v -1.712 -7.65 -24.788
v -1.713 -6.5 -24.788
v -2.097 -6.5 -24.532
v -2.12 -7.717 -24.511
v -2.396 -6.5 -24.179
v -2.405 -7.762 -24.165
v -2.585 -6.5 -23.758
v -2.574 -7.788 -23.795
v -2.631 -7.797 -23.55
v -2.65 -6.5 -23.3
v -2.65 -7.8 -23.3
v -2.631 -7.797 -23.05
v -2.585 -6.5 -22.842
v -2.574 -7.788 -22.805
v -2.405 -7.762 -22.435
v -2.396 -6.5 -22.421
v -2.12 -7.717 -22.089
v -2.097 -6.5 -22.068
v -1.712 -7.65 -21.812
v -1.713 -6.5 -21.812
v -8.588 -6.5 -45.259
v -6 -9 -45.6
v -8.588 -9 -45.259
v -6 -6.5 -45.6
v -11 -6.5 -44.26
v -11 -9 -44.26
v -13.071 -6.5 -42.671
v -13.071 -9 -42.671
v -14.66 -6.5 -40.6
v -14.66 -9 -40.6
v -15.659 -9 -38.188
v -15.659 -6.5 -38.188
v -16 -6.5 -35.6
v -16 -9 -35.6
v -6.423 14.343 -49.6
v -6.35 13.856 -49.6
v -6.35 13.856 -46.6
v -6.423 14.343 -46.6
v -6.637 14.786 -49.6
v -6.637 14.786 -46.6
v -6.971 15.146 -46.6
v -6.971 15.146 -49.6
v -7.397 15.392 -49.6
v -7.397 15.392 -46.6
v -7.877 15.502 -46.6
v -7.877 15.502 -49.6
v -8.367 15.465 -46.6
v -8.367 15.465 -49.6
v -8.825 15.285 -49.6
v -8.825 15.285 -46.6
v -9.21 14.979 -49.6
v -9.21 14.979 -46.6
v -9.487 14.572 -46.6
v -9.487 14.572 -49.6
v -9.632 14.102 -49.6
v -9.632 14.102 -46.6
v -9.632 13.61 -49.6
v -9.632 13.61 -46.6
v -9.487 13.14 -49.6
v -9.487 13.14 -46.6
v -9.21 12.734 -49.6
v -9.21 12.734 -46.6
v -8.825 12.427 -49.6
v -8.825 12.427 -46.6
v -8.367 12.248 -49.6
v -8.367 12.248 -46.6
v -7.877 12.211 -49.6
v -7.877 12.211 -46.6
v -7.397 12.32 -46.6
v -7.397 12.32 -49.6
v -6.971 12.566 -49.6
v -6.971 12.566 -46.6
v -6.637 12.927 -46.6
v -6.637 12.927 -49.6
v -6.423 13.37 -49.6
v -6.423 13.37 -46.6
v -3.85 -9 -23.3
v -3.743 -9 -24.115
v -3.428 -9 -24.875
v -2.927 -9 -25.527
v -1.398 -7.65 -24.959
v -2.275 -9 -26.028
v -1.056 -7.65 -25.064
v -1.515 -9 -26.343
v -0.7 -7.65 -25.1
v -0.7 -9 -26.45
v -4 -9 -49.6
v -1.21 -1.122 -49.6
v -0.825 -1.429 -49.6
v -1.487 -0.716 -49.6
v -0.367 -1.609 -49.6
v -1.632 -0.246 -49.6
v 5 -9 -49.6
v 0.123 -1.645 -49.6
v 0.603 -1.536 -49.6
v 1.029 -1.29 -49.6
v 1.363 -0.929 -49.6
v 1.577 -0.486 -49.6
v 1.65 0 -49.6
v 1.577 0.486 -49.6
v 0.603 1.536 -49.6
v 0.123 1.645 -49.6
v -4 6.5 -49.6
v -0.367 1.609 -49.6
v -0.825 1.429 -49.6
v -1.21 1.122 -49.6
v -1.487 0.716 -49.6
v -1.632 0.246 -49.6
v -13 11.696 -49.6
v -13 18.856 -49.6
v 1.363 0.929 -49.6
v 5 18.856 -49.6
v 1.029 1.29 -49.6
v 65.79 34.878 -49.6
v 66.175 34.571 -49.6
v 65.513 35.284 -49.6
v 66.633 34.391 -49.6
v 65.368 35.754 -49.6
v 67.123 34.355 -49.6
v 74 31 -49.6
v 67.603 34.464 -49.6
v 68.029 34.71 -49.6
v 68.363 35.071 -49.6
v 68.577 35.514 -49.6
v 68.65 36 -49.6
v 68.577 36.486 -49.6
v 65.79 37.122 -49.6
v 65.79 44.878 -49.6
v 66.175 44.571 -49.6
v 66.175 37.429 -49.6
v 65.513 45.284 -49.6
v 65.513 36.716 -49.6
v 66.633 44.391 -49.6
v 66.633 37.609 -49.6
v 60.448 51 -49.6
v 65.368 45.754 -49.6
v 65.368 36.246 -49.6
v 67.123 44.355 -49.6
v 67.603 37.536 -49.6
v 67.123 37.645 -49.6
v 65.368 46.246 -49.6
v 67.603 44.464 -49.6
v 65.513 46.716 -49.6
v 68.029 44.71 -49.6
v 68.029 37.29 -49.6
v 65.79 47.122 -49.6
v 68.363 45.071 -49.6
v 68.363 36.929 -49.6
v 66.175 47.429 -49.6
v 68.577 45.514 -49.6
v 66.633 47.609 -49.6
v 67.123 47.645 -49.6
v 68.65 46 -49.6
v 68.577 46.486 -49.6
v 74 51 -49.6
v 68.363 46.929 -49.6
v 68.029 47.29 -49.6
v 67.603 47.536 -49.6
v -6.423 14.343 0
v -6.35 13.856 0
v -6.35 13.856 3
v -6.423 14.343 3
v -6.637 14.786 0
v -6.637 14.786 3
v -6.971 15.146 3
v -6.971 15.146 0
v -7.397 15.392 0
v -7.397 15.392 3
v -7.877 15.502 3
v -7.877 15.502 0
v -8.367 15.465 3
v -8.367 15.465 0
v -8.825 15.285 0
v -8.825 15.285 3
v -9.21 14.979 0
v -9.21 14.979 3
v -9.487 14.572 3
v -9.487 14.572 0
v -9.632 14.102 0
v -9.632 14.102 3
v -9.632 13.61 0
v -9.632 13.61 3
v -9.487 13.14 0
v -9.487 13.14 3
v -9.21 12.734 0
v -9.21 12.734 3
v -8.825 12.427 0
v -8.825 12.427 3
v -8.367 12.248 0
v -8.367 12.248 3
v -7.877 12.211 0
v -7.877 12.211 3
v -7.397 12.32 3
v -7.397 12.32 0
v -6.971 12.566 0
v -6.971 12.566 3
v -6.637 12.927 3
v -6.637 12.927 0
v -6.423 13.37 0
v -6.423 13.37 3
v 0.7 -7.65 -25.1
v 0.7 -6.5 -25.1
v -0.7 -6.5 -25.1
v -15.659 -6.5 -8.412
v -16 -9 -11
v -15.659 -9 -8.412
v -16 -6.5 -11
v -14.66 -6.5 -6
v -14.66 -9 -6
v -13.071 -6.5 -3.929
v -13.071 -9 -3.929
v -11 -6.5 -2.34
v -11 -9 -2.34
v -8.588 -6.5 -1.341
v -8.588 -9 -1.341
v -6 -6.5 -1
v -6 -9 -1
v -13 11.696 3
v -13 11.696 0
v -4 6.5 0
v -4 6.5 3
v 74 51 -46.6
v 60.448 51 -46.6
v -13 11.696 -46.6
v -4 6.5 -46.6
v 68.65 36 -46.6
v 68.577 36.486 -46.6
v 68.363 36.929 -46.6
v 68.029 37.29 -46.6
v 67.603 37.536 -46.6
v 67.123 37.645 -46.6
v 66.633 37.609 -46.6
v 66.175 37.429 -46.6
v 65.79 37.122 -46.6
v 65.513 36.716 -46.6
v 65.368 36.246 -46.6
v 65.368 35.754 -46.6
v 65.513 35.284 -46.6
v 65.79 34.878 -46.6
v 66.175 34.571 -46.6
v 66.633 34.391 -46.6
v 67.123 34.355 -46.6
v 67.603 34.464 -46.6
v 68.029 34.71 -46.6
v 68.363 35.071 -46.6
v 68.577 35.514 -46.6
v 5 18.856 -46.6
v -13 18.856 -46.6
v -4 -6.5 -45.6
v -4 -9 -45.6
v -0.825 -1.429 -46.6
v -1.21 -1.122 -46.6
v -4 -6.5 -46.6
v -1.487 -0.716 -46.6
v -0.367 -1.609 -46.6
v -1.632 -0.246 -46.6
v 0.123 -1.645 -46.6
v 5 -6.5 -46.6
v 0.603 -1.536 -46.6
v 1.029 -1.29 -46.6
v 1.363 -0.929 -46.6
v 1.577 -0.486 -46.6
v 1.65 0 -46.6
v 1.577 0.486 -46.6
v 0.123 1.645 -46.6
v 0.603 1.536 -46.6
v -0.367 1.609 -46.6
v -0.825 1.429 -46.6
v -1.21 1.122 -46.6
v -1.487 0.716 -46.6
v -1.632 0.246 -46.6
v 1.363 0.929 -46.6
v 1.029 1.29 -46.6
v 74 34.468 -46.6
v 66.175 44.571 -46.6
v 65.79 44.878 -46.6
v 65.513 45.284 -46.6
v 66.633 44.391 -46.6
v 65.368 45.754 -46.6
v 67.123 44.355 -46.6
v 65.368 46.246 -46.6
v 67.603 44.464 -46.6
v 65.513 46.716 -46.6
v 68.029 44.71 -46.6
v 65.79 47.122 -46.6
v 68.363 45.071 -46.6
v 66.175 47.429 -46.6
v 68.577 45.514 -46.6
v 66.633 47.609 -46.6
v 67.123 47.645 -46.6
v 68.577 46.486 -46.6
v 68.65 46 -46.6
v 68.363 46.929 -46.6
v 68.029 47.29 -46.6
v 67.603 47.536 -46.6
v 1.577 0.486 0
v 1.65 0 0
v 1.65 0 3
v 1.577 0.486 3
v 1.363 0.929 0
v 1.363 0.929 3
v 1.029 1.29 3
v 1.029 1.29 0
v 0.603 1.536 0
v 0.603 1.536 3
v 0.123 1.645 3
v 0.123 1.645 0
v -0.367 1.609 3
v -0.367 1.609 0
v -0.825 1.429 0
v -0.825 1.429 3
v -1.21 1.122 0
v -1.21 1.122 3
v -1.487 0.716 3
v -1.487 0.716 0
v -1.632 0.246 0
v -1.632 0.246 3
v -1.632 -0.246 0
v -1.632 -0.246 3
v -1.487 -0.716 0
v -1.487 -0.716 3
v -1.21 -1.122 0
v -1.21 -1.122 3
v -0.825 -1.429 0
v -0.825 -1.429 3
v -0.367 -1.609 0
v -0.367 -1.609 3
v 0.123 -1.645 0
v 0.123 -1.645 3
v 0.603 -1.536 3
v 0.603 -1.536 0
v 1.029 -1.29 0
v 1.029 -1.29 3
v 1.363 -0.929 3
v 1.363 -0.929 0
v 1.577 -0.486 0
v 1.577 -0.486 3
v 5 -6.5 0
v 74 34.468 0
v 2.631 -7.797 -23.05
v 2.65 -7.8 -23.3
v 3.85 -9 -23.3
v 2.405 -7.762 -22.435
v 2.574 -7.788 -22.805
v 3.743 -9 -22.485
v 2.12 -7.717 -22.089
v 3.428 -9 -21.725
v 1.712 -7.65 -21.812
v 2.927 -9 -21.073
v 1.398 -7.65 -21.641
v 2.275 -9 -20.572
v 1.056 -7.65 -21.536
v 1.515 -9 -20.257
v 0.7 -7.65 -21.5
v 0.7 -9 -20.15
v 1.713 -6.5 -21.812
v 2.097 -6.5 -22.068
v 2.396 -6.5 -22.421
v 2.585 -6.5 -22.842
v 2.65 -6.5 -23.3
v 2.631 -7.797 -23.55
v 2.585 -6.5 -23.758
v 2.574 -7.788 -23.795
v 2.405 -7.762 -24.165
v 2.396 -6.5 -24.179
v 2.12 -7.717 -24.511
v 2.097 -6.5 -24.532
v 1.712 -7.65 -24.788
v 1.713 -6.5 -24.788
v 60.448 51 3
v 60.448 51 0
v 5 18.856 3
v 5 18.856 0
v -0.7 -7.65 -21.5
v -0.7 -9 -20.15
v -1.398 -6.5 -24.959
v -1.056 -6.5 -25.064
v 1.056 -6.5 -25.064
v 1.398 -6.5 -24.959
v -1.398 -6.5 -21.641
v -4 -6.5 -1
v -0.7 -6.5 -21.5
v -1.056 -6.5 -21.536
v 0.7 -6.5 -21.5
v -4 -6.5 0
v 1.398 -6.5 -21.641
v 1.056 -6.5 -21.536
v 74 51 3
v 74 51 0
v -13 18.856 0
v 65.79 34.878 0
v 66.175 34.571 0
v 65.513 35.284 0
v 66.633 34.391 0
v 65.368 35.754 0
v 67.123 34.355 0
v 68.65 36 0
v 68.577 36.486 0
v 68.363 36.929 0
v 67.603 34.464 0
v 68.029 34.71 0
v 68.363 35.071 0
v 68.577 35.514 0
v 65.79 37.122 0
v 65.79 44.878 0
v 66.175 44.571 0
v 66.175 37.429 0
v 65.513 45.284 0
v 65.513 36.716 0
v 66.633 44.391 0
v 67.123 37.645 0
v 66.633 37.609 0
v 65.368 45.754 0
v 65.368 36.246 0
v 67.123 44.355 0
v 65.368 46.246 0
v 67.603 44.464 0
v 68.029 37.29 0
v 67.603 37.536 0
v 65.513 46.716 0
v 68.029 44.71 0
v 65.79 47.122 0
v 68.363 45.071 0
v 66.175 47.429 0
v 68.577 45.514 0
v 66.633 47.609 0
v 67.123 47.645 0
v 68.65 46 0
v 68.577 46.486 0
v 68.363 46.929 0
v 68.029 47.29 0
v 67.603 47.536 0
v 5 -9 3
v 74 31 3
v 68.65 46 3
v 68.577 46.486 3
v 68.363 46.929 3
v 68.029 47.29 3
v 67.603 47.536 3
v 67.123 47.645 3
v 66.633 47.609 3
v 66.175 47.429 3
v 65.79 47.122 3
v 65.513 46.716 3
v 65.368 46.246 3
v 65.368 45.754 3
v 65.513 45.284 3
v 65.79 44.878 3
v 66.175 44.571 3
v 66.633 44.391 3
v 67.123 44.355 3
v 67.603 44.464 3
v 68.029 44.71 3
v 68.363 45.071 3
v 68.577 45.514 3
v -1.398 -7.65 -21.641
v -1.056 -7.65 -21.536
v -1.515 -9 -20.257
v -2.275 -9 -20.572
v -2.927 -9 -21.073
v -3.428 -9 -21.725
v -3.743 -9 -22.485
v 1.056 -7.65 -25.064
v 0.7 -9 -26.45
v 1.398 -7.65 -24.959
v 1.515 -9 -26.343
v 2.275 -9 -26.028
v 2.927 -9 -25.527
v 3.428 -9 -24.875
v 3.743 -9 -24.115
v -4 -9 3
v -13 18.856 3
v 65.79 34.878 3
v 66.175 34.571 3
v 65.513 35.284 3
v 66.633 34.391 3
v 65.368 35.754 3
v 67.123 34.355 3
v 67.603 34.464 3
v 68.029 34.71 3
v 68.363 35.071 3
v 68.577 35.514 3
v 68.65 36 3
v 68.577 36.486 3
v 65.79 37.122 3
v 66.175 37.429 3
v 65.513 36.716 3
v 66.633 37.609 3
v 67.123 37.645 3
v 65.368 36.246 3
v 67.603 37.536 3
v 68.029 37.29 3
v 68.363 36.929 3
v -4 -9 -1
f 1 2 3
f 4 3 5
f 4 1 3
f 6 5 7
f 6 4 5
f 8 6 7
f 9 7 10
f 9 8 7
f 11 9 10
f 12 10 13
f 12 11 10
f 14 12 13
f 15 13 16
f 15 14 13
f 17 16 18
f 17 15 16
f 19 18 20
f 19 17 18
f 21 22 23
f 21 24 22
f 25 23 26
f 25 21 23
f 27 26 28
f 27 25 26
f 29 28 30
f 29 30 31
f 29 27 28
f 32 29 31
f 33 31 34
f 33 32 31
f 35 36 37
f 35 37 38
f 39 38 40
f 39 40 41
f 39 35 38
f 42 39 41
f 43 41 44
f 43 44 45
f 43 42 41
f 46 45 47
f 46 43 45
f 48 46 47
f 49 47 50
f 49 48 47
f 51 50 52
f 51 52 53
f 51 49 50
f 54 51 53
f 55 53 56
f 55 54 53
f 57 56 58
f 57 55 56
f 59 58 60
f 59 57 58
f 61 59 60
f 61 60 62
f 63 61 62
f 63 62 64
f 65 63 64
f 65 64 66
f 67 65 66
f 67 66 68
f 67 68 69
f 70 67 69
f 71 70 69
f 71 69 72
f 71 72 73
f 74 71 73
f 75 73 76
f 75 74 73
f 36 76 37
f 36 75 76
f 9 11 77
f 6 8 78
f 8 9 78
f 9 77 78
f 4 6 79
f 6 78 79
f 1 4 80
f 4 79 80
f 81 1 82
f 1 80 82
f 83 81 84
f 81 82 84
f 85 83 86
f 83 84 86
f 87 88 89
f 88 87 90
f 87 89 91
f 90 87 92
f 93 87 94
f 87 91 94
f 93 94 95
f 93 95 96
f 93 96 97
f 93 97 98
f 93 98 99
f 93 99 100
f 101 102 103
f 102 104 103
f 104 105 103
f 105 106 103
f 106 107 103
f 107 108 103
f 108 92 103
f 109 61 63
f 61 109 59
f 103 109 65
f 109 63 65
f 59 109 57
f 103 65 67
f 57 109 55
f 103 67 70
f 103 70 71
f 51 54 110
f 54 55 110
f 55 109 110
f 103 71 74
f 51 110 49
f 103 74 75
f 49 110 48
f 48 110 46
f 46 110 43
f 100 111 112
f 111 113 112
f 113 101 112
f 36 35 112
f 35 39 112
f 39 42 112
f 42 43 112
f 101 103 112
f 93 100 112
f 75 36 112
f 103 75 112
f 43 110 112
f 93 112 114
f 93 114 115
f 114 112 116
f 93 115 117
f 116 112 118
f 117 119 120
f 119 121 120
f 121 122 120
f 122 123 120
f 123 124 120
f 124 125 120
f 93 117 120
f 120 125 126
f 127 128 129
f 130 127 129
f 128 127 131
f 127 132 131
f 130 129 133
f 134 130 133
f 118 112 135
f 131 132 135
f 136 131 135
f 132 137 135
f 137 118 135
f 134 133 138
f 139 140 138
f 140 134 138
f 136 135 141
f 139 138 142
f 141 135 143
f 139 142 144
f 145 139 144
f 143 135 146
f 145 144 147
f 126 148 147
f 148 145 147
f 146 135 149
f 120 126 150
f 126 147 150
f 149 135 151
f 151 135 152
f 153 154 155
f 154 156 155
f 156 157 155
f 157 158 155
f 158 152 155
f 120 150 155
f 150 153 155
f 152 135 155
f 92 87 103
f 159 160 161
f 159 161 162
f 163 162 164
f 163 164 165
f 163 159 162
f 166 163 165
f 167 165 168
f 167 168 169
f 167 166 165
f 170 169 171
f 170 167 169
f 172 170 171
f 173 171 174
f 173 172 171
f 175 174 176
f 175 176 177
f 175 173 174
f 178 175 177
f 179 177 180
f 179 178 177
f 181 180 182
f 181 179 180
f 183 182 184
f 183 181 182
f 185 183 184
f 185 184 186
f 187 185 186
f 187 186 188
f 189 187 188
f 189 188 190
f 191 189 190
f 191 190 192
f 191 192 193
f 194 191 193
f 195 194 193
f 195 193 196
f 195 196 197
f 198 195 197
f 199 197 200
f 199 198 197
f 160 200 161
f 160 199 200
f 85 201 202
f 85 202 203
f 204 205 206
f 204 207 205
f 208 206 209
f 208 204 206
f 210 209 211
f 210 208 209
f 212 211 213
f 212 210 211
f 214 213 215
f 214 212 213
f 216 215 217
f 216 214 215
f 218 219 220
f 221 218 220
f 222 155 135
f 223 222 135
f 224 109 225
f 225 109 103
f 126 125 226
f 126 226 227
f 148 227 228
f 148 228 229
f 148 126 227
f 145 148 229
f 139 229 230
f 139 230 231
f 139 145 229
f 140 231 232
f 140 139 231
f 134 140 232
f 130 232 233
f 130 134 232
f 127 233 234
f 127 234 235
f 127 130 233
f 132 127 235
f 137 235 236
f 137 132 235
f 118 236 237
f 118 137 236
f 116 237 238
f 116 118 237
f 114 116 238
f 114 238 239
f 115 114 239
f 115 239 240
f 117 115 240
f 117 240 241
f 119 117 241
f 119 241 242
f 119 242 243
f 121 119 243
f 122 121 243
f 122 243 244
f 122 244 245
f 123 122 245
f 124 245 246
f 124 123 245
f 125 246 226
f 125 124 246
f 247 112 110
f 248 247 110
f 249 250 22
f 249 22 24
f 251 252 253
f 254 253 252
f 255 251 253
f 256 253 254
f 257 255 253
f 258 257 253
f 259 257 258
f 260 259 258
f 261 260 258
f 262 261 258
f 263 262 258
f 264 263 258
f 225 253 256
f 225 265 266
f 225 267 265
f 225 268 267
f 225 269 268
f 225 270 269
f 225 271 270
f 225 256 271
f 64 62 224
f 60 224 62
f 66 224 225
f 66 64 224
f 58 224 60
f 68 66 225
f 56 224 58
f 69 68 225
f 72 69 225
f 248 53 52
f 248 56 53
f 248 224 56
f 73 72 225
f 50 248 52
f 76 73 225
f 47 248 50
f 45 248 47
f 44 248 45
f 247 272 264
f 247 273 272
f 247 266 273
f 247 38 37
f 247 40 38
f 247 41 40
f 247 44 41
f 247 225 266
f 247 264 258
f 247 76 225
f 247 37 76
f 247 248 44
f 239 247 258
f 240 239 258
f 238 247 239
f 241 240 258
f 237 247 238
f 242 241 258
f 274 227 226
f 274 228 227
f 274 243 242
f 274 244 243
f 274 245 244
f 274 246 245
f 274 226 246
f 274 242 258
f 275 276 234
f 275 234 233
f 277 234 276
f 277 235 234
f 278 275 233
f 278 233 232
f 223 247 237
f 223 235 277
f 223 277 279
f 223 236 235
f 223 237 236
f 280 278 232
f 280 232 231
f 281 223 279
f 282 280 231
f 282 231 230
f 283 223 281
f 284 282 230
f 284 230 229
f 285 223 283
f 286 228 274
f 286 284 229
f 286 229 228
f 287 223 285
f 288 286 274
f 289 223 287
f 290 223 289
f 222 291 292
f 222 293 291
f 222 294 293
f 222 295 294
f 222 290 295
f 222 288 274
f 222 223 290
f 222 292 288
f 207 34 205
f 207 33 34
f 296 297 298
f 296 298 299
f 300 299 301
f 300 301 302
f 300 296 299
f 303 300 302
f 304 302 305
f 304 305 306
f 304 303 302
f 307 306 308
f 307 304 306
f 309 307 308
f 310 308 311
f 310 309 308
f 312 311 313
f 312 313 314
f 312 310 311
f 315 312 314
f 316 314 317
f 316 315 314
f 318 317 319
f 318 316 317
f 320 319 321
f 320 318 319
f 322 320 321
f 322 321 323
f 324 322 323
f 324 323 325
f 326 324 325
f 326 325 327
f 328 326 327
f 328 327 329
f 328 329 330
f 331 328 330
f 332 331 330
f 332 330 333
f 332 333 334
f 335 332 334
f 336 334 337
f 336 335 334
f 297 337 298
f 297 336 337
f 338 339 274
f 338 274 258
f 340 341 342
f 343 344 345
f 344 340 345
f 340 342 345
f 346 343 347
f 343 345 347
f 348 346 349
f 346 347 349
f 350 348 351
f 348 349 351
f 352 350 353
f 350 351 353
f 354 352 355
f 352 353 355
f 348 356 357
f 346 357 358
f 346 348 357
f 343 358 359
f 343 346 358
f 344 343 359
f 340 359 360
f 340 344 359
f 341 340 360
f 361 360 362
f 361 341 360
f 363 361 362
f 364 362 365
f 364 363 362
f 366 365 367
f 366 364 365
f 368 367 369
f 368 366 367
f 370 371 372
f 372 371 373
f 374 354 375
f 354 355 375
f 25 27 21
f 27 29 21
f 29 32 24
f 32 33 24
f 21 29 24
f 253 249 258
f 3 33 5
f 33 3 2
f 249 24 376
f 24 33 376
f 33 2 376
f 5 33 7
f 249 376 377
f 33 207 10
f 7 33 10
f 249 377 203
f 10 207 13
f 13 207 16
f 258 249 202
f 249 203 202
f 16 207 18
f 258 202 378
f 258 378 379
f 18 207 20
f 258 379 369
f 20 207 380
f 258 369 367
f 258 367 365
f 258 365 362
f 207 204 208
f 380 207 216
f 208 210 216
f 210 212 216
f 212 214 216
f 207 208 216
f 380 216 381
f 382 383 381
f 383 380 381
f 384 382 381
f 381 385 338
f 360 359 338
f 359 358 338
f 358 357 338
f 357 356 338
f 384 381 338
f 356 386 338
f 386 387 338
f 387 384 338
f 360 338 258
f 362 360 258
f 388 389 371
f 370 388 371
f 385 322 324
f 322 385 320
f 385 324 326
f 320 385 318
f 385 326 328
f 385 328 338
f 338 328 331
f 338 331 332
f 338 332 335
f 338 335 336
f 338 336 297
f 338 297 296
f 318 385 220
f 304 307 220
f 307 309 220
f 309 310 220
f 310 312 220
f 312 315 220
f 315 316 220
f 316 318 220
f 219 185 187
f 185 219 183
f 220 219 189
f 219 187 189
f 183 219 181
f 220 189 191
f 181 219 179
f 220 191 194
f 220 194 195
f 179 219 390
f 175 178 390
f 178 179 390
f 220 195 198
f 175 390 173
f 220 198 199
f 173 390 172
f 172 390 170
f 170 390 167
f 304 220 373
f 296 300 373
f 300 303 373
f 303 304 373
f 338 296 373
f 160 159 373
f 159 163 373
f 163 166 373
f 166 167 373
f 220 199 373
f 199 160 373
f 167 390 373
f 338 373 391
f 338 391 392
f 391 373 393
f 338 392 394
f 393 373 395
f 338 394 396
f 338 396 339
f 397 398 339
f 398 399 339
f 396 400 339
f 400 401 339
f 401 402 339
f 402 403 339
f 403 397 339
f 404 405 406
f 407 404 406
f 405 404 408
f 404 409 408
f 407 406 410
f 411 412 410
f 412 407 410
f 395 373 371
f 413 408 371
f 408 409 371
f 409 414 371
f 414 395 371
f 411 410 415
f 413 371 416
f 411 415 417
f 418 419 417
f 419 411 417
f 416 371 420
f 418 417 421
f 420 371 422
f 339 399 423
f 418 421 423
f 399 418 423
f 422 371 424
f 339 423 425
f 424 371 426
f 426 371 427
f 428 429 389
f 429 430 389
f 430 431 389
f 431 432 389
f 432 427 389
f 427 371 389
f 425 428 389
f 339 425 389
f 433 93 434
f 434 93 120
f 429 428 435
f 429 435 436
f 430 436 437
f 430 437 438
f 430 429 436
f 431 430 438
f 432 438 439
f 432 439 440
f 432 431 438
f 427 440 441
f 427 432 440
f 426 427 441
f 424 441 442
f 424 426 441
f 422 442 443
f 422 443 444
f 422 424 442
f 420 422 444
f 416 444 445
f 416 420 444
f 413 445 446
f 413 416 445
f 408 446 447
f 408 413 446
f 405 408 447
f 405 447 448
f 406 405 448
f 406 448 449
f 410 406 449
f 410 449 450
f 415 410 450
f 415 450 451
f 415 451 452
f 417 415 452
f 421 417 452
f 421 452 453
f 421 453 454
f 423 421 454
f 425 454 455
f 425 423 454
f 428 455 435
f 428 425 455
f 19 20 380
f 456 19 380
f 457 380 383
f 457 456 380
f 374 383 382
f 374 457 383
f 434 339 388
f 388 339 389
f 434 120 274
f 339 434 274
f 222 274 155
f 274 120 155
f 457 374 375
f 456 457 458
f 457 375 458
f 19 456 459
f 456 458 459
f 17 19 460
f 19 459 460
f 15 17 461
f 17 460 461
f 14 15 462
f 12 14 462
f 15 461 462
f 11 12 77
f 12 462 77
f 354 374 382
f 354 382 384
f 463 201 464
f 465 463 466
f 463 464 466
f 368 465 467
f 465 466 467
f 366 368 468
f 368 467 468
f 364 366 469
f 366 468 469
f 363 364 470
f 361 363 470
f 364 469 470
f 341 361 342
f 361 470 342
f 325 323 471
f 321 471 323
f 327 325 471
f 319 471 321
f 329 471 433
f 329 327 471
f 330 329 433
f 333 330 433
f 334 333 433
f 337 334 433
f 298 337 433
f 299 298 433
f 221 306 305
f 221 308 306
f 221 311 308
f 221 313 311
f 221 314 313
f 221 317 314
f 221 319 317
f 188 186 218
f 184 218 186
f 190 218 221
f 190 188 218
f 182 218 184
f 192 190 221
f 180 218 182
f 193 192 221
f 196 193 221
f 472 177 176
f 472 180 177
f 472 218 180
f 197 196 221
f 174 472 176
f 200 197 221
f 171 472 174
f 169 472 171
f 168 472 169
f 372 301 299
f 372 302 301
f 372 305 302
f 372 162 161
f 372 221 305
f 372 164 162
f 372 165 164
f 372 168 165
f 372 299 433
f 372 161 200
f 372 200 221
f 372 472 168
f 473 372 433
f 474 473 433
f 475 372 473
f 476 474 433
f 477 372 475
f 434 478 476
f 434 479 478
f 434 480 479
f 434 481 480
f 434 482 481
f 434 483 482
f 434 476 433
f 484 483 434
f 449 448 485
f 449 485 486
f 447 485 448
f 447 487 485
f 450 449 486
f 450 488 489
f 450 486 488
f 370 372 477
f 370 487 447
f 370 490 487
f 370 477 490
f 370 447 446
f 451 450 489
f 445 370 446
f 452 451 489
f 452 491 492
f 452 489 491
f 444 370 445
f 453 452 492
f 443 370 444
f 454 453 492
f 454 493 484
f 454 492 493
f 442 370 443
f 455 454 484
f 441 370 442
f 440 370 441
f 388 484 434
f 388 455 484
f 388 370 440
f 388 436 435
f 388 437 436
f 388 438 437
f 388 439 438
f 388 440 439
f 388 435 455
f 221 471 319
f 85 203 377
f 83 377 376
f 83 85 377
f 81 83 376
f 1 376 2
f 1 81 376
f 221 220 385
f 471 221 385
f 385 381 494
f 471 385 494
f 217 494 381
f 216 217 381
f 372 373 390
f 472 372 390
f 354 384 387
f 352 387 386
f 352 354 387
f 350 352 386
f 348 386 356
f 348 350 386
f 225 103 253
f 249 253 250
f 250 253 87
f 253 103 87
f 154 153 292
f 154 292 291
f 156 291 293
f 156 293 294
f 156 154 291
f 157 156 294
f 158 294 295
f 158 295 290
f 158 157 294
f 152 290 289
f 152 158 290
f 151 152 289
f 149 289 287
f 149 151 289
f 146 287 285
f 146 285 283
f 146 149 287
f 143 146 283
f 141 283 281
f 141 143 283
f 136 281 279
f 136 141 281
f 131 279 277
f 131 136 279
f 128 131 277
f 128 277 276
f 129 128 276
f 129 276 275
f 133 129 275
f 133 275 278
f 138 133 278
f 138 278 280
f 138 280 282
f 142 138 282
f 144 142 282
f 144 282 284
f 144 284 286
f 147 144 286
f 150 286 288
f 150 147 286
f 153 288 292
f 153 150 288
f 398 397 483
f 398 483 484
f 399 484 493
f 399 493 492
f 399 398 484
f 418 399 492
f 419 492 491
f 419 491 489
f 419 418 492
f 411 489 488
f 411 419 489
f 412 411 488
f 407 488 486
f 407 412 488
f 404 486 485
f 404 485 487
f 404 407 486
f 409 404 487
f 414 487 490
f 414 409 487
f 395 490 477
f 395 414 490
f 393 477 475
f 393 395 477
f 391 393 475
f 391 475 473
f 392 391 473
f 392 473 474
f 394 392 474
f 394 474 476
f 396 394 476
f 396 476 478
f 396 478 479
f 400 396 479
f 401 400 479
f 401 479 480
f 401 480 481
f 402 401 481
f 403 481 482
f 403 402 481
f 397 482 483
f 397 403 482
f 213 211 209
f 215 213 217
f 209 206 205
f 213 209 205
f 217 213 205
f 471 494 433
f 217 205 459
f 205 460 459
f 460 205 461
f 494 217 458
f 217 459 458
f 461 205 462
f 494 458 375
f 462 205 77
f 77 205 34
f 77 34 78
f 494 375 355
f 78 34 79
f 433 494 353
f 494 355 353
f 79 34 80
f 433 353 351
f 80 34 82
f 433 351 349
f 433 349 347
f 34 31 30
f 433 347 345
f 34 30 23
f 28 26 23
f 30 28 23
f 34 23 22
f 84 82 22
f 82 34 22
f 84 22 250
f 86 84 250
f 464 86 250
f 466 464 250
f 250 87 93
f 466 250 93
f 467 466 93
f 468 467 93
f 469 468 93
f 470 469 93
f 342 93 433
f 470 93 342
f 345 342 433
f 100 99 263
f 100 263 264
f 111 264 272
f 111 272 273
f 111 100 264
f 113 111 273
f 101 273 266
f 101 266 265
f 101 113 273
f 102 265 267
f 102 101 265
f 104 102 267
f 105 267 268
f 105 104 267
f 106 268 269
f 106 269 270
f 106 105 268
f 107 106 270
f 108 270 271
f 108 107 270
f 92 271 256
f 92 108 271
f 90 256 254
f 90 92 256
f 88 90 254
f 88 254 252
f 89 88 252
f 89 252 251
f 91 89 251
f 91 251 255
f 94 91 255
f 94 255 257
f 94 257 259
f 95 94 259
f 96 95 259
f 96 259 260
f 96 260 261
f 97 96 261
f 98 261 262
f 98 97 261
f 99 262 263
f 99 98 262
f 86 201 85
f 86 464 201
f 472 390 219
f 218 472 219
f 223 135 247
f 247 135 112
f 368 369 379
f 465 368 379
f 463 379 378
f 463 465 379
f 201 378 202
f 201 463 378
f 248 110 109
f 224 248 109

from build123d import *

# Parameters (mm, degrees)
SKETCH1_R                                      = 1.65
BOSS_EXTRUDE1_DEPTH                            = 3
SKETCH1_3_W                                    = 9
SKETCH1_3_H                                    = 2.5
BOSS_EXTRUDE2_DEPTH                            = 46.6
BOSS_EXTRUDE3_START                            = -49.6
SKETCH1_4_R                                    = 1.65
SKETCH1_4_W                                    = 9
SKETCH1_4_H                                    = 2.5
BOSS_EXTRUDE3_DEPTH                            = 3
CUT_EXTRUDE1_DEPTH                             = 88.5
SKETCH3_W                                      = 44.6
SKETCH3_H                                      = 2.5
BOSS_EXTRUDE4_DEPTH                            = 12
FILLET1_R                                      = 10
CSK_START                                      = -9
CSK_SLOT_FOR_M3_COUNTERSUNK_FLAT_HEAD_SC_DEPTH = 3


with BuildPart() as part:
    # Sketch1 → Boss-Extrude1 (new body)
    with BuildSketch(Plane.XY):
        Polygon((-13, 18.856406461), (-13, 11.696152423), (-4, 6.5), (-4, -9), (5, -9), (74, 31), (74, 51), (60.447698856, 51), (5, 18.856406461), align=None)
        Circle(SKETCH1_R, mode=Mode.SUBTRACT)
        with Locations((-8, 13.856406461)):
            Circle(SKETCH1_R, mode=Mode.SUBTRACT)
        with Locations((67, 46)):
            Circle(SKETCH1_R, mode=Mode.SUBTRACT)
        with Locations((67, 36)):
            Circle(SKETCH1_R, mode=Mode.SUBTRACT)
    extrude(amount=BOSS_EXTRUDE1_DEPTH)

    # Sketch1<3> → Boss-Extrude2 (add)
    with BuildSketch(Plane.XY):
        with Locations((0.5, -7.75)):
            Rectangle(SKETCH1_3_W, SKETCH1_3_H)
        Polygon((74, 34.467646849), (5, -6.5), (5, -9), (74, 31), align=None)
    extrude(amount=-BOSS_EXTRUDE2_DEPTH)

    # Sketch1<4> → Boss-Extrude3 (add)
    # profile 1 of 4: a face of its own
    with BuildSketch(Plane.XY.offset(BOSS_EXTRUDE3_START)):
        Polygon((5, 18.856406461), (-13, 18.856406461), (-13, 11.696152423), (-4, 6.5), (-4, -6.5), (5, -6.5), align=None)
        Circle(SKETCH1_4_R, mode=Mode.SUBTRACT)
        with Locations((-8, 13.856406461)):
            Circle(SKETCH1_4_R, mode=Mode.SUBTRACT)
    # profile 2 of 4: a face of its own
    with BuildSketch(Plane.XY.offset(BOSS_EXTRUDE3_START)):
        with Locations((0.5, -7.75)):
            Rectangle(SKETCH1_4_W, SKETCH1_4_H)
    # profile 3 of 4: a face of its own
    with BuildSketch(Plane.XY.offset(BOSS_EXTRUDE3_START)):
        Polygon((74, 34.467646849), (5, -6.5), (5, -9), (74, 31), align=None)
    # profile 4 of 4: a face of its own
    with BuildSketch(Plane.XY.offset(BOSS_EXTRUDE3_START)):
        Polygon((60.447698856, 51), (5, 18.856406461), (5, -6.5), (74, 34.467646849), (74, 51), align=None)
        with Locations((67, 36)):
            Circle(SKETCH1_4_R, mode=Mode.SUBTRACT)
        with Locations((67, 46)):
            Circle(SKETCH1_4_R, mode=Mode.SUBTRACT)
    extrude(amount=BOSS_EXTRUDE3_DEPTH)

    # Sketch2 → Cut-Extrude1 (cut)
    with BuildSketch(Plane.XZ.offset(9)):
        with BuildLine():
            Line((1, -24.95), (-1, -24.95))
            ThreePointArc((-1, -24.95), (-2.65, -23.3), (-1, -21.65))
            Line((-1, -21.65), (1, -21.65))
            ThreePointArc((1, -21.65), (2.65, -23.3), (1, -24.95))
        make_face()
    extrude(amount=-CUT_EXTRUDE1_DEPTH, mode=Mode.SUBTRACT)

    # Sketch3 → Boss-Extrude4 (add)
    with BuildSketch(Plane.ZY.offset(4)):
        with Locations((-23.3, -7.75)):
            Rectangle(SKETCH3_W, SKETCH3_H)
    extrude(amount=BOSS_EXTRUDE4_DEPTH)

    # Fillet1
    fillet1_edges = [part.edges().sort_by_distance(p)[0] for p in [
        (-16, -7.75, -45.6),
        (-16, -7.75, -1),
    ]]
    fillet(fillet1_edges, radius=FILLET1_R)

    # CSK SLOT for M3 Countersunk Flat Head Screw1: read off the stored shape, not the designer's step
    # CSK SLOT for M3 Countersunk Flat Hea 2 → CSK SLOT for M3 Countersunk Flat Head Screw1 (cut)
    with BuildSketch(Plane(origin=(0, 0, 0), x_dir=(1, 0, 0), z_dir=(0, 1, 0)).offset(CSK_START)):
        with BuildLine():
            ThreePointArc((-1.7125, 21.811764888), (-1.229705955, 21.579705955), (-0.7, 21.5))
            Line((-0.7, 21.5), (0.7, 21.5))
            ThreePointArc((0.7, 21.5), (1.229705955, 21.579705955), (1.7125, 21.811764888))
            ThreePointArc((1.7125, 21.811764888), (1.365316345, 21.690949358), (1, 21.65))
            Line((1, 21.65), (-1, 21.65))
            ThreePointArc((-1, 21.65), (-1.365316345, 21.690949358), (-1.7125, 21.811764888))
        make_face()
        with BuildLine():
            ThreePointArc((-0.7, 25.1), (-1.229705955, 25.020294045), (-1.7125, 24.788235112))
            ThreePointArc((-1.7125, 24.788235112), (-1.365316345, 24.909050642), (-1, 24.95))
            Line((-1, 24.95), (1, 24.95))
            ThreePointArc((1, 24.95), (1.365316345, 24.909050642), (1.7125, 24.788235112))
            ThreePointArc((1.7125, 24.788235112), (1.229705955, 25.020294045), (0.7, 25.1))
            Line((0.7, 25.1), (-0.7, 25.1))
        make_face()
    extrude(amount=CSK_SLOT_FOR_M3_COUNTERSUNK_FLAT_HEAD_SC_DEPTH, mode=Mode.SUBTRACT)

    # CSK SLOT for M3 Countersunk Flat Hea 3: loft between two sections, ruled curve by curve
    csk_slot_for_m3_countersunk_flat_hea_3_from = [
        Edge.make_three_point_arc((0.7, -7.649999999, -25.099999999), (1.972792205, -7.649999999, -24.572792205), (2.499999999, -7.649999999, -23.3)),
        Edge.make_three_point_arc((2.499999999, -7.649999999, -23.3), (1.972792205, -7.649999999, -22.027207795), (0.7, -7.649999999, -21.500000001)),
        Edge.make_three_point_arc((-0.7, -7.649999999, -21.500000001), (-1.972792205, -7.649999999, -22.027207795), (-2.499999999, -7.649999999, -23.3)),
        Edge.make_three_point_arc((-2.499999999, -7.649999999, -23.3), (-1.972792205, -7.649999999, -24.572792205), (-0.7, -7.649999999, -25.099999999)),
        Edge.make_line((0.7, -7.649999999, -21.500000001), (-0.7, -7.649999999, -21.500000001)),
        Edge.make_line((0.7, -7.649999999, -25.099999999), (-0.7, -7.649999999, -25.099999999)),
    ]
    csk_slot_for_m3_countersunk_flat_hea_3_to = [
        Edge.make_three_point_arc((0.7, -9, -26.45), (2.927386361, -9, -25.527386361), (3.85, -9, -23.3)),
        Edge.make_three_point_arc((3.85, -9, -23.3), (2.927386361, -9, -21.072613639), (0.7, -9, -20.15)),
        Edge.make_three_point_arc((-0.7, -9, -20.15), (-2.927386361, -9, -21.072613639), (-3.85, -9, -23.3)),
        Edge.make_three_point_arc((-3.85, -9, -23.3), (-2.927386361, -9, -25.527386361), (-0.7, -9, -26.45)),
        Edge.make_line((0.7, -9, -20.15), (-0.7, -9, -20.15)),
        Edge.make_line((0.7, -9, -26.45), (-0.7, -9, -26.45)),
    ]
    csk_slot_for_m3_countersunk_flat_hea_3 = Solid(Shell([*[Face.make_surface_from_curves(csk_slot_for_m3_countersunk_flat_hea_3_from[k], csk_slot_for_m3_countersunk_flat_hea_3_to[k]) for k in range(6)], Face(Wire(csk_slot_for_m3_countersunk_flat_hea_3_from)), Face(Wire(csk_slot_for_m3_countersunk_flat_hea_3_to))]))
    add(csk_slot_for_m3_countersunk_flat_hea_3, mode=Mode.SUBTRACT)


solid = part.part
